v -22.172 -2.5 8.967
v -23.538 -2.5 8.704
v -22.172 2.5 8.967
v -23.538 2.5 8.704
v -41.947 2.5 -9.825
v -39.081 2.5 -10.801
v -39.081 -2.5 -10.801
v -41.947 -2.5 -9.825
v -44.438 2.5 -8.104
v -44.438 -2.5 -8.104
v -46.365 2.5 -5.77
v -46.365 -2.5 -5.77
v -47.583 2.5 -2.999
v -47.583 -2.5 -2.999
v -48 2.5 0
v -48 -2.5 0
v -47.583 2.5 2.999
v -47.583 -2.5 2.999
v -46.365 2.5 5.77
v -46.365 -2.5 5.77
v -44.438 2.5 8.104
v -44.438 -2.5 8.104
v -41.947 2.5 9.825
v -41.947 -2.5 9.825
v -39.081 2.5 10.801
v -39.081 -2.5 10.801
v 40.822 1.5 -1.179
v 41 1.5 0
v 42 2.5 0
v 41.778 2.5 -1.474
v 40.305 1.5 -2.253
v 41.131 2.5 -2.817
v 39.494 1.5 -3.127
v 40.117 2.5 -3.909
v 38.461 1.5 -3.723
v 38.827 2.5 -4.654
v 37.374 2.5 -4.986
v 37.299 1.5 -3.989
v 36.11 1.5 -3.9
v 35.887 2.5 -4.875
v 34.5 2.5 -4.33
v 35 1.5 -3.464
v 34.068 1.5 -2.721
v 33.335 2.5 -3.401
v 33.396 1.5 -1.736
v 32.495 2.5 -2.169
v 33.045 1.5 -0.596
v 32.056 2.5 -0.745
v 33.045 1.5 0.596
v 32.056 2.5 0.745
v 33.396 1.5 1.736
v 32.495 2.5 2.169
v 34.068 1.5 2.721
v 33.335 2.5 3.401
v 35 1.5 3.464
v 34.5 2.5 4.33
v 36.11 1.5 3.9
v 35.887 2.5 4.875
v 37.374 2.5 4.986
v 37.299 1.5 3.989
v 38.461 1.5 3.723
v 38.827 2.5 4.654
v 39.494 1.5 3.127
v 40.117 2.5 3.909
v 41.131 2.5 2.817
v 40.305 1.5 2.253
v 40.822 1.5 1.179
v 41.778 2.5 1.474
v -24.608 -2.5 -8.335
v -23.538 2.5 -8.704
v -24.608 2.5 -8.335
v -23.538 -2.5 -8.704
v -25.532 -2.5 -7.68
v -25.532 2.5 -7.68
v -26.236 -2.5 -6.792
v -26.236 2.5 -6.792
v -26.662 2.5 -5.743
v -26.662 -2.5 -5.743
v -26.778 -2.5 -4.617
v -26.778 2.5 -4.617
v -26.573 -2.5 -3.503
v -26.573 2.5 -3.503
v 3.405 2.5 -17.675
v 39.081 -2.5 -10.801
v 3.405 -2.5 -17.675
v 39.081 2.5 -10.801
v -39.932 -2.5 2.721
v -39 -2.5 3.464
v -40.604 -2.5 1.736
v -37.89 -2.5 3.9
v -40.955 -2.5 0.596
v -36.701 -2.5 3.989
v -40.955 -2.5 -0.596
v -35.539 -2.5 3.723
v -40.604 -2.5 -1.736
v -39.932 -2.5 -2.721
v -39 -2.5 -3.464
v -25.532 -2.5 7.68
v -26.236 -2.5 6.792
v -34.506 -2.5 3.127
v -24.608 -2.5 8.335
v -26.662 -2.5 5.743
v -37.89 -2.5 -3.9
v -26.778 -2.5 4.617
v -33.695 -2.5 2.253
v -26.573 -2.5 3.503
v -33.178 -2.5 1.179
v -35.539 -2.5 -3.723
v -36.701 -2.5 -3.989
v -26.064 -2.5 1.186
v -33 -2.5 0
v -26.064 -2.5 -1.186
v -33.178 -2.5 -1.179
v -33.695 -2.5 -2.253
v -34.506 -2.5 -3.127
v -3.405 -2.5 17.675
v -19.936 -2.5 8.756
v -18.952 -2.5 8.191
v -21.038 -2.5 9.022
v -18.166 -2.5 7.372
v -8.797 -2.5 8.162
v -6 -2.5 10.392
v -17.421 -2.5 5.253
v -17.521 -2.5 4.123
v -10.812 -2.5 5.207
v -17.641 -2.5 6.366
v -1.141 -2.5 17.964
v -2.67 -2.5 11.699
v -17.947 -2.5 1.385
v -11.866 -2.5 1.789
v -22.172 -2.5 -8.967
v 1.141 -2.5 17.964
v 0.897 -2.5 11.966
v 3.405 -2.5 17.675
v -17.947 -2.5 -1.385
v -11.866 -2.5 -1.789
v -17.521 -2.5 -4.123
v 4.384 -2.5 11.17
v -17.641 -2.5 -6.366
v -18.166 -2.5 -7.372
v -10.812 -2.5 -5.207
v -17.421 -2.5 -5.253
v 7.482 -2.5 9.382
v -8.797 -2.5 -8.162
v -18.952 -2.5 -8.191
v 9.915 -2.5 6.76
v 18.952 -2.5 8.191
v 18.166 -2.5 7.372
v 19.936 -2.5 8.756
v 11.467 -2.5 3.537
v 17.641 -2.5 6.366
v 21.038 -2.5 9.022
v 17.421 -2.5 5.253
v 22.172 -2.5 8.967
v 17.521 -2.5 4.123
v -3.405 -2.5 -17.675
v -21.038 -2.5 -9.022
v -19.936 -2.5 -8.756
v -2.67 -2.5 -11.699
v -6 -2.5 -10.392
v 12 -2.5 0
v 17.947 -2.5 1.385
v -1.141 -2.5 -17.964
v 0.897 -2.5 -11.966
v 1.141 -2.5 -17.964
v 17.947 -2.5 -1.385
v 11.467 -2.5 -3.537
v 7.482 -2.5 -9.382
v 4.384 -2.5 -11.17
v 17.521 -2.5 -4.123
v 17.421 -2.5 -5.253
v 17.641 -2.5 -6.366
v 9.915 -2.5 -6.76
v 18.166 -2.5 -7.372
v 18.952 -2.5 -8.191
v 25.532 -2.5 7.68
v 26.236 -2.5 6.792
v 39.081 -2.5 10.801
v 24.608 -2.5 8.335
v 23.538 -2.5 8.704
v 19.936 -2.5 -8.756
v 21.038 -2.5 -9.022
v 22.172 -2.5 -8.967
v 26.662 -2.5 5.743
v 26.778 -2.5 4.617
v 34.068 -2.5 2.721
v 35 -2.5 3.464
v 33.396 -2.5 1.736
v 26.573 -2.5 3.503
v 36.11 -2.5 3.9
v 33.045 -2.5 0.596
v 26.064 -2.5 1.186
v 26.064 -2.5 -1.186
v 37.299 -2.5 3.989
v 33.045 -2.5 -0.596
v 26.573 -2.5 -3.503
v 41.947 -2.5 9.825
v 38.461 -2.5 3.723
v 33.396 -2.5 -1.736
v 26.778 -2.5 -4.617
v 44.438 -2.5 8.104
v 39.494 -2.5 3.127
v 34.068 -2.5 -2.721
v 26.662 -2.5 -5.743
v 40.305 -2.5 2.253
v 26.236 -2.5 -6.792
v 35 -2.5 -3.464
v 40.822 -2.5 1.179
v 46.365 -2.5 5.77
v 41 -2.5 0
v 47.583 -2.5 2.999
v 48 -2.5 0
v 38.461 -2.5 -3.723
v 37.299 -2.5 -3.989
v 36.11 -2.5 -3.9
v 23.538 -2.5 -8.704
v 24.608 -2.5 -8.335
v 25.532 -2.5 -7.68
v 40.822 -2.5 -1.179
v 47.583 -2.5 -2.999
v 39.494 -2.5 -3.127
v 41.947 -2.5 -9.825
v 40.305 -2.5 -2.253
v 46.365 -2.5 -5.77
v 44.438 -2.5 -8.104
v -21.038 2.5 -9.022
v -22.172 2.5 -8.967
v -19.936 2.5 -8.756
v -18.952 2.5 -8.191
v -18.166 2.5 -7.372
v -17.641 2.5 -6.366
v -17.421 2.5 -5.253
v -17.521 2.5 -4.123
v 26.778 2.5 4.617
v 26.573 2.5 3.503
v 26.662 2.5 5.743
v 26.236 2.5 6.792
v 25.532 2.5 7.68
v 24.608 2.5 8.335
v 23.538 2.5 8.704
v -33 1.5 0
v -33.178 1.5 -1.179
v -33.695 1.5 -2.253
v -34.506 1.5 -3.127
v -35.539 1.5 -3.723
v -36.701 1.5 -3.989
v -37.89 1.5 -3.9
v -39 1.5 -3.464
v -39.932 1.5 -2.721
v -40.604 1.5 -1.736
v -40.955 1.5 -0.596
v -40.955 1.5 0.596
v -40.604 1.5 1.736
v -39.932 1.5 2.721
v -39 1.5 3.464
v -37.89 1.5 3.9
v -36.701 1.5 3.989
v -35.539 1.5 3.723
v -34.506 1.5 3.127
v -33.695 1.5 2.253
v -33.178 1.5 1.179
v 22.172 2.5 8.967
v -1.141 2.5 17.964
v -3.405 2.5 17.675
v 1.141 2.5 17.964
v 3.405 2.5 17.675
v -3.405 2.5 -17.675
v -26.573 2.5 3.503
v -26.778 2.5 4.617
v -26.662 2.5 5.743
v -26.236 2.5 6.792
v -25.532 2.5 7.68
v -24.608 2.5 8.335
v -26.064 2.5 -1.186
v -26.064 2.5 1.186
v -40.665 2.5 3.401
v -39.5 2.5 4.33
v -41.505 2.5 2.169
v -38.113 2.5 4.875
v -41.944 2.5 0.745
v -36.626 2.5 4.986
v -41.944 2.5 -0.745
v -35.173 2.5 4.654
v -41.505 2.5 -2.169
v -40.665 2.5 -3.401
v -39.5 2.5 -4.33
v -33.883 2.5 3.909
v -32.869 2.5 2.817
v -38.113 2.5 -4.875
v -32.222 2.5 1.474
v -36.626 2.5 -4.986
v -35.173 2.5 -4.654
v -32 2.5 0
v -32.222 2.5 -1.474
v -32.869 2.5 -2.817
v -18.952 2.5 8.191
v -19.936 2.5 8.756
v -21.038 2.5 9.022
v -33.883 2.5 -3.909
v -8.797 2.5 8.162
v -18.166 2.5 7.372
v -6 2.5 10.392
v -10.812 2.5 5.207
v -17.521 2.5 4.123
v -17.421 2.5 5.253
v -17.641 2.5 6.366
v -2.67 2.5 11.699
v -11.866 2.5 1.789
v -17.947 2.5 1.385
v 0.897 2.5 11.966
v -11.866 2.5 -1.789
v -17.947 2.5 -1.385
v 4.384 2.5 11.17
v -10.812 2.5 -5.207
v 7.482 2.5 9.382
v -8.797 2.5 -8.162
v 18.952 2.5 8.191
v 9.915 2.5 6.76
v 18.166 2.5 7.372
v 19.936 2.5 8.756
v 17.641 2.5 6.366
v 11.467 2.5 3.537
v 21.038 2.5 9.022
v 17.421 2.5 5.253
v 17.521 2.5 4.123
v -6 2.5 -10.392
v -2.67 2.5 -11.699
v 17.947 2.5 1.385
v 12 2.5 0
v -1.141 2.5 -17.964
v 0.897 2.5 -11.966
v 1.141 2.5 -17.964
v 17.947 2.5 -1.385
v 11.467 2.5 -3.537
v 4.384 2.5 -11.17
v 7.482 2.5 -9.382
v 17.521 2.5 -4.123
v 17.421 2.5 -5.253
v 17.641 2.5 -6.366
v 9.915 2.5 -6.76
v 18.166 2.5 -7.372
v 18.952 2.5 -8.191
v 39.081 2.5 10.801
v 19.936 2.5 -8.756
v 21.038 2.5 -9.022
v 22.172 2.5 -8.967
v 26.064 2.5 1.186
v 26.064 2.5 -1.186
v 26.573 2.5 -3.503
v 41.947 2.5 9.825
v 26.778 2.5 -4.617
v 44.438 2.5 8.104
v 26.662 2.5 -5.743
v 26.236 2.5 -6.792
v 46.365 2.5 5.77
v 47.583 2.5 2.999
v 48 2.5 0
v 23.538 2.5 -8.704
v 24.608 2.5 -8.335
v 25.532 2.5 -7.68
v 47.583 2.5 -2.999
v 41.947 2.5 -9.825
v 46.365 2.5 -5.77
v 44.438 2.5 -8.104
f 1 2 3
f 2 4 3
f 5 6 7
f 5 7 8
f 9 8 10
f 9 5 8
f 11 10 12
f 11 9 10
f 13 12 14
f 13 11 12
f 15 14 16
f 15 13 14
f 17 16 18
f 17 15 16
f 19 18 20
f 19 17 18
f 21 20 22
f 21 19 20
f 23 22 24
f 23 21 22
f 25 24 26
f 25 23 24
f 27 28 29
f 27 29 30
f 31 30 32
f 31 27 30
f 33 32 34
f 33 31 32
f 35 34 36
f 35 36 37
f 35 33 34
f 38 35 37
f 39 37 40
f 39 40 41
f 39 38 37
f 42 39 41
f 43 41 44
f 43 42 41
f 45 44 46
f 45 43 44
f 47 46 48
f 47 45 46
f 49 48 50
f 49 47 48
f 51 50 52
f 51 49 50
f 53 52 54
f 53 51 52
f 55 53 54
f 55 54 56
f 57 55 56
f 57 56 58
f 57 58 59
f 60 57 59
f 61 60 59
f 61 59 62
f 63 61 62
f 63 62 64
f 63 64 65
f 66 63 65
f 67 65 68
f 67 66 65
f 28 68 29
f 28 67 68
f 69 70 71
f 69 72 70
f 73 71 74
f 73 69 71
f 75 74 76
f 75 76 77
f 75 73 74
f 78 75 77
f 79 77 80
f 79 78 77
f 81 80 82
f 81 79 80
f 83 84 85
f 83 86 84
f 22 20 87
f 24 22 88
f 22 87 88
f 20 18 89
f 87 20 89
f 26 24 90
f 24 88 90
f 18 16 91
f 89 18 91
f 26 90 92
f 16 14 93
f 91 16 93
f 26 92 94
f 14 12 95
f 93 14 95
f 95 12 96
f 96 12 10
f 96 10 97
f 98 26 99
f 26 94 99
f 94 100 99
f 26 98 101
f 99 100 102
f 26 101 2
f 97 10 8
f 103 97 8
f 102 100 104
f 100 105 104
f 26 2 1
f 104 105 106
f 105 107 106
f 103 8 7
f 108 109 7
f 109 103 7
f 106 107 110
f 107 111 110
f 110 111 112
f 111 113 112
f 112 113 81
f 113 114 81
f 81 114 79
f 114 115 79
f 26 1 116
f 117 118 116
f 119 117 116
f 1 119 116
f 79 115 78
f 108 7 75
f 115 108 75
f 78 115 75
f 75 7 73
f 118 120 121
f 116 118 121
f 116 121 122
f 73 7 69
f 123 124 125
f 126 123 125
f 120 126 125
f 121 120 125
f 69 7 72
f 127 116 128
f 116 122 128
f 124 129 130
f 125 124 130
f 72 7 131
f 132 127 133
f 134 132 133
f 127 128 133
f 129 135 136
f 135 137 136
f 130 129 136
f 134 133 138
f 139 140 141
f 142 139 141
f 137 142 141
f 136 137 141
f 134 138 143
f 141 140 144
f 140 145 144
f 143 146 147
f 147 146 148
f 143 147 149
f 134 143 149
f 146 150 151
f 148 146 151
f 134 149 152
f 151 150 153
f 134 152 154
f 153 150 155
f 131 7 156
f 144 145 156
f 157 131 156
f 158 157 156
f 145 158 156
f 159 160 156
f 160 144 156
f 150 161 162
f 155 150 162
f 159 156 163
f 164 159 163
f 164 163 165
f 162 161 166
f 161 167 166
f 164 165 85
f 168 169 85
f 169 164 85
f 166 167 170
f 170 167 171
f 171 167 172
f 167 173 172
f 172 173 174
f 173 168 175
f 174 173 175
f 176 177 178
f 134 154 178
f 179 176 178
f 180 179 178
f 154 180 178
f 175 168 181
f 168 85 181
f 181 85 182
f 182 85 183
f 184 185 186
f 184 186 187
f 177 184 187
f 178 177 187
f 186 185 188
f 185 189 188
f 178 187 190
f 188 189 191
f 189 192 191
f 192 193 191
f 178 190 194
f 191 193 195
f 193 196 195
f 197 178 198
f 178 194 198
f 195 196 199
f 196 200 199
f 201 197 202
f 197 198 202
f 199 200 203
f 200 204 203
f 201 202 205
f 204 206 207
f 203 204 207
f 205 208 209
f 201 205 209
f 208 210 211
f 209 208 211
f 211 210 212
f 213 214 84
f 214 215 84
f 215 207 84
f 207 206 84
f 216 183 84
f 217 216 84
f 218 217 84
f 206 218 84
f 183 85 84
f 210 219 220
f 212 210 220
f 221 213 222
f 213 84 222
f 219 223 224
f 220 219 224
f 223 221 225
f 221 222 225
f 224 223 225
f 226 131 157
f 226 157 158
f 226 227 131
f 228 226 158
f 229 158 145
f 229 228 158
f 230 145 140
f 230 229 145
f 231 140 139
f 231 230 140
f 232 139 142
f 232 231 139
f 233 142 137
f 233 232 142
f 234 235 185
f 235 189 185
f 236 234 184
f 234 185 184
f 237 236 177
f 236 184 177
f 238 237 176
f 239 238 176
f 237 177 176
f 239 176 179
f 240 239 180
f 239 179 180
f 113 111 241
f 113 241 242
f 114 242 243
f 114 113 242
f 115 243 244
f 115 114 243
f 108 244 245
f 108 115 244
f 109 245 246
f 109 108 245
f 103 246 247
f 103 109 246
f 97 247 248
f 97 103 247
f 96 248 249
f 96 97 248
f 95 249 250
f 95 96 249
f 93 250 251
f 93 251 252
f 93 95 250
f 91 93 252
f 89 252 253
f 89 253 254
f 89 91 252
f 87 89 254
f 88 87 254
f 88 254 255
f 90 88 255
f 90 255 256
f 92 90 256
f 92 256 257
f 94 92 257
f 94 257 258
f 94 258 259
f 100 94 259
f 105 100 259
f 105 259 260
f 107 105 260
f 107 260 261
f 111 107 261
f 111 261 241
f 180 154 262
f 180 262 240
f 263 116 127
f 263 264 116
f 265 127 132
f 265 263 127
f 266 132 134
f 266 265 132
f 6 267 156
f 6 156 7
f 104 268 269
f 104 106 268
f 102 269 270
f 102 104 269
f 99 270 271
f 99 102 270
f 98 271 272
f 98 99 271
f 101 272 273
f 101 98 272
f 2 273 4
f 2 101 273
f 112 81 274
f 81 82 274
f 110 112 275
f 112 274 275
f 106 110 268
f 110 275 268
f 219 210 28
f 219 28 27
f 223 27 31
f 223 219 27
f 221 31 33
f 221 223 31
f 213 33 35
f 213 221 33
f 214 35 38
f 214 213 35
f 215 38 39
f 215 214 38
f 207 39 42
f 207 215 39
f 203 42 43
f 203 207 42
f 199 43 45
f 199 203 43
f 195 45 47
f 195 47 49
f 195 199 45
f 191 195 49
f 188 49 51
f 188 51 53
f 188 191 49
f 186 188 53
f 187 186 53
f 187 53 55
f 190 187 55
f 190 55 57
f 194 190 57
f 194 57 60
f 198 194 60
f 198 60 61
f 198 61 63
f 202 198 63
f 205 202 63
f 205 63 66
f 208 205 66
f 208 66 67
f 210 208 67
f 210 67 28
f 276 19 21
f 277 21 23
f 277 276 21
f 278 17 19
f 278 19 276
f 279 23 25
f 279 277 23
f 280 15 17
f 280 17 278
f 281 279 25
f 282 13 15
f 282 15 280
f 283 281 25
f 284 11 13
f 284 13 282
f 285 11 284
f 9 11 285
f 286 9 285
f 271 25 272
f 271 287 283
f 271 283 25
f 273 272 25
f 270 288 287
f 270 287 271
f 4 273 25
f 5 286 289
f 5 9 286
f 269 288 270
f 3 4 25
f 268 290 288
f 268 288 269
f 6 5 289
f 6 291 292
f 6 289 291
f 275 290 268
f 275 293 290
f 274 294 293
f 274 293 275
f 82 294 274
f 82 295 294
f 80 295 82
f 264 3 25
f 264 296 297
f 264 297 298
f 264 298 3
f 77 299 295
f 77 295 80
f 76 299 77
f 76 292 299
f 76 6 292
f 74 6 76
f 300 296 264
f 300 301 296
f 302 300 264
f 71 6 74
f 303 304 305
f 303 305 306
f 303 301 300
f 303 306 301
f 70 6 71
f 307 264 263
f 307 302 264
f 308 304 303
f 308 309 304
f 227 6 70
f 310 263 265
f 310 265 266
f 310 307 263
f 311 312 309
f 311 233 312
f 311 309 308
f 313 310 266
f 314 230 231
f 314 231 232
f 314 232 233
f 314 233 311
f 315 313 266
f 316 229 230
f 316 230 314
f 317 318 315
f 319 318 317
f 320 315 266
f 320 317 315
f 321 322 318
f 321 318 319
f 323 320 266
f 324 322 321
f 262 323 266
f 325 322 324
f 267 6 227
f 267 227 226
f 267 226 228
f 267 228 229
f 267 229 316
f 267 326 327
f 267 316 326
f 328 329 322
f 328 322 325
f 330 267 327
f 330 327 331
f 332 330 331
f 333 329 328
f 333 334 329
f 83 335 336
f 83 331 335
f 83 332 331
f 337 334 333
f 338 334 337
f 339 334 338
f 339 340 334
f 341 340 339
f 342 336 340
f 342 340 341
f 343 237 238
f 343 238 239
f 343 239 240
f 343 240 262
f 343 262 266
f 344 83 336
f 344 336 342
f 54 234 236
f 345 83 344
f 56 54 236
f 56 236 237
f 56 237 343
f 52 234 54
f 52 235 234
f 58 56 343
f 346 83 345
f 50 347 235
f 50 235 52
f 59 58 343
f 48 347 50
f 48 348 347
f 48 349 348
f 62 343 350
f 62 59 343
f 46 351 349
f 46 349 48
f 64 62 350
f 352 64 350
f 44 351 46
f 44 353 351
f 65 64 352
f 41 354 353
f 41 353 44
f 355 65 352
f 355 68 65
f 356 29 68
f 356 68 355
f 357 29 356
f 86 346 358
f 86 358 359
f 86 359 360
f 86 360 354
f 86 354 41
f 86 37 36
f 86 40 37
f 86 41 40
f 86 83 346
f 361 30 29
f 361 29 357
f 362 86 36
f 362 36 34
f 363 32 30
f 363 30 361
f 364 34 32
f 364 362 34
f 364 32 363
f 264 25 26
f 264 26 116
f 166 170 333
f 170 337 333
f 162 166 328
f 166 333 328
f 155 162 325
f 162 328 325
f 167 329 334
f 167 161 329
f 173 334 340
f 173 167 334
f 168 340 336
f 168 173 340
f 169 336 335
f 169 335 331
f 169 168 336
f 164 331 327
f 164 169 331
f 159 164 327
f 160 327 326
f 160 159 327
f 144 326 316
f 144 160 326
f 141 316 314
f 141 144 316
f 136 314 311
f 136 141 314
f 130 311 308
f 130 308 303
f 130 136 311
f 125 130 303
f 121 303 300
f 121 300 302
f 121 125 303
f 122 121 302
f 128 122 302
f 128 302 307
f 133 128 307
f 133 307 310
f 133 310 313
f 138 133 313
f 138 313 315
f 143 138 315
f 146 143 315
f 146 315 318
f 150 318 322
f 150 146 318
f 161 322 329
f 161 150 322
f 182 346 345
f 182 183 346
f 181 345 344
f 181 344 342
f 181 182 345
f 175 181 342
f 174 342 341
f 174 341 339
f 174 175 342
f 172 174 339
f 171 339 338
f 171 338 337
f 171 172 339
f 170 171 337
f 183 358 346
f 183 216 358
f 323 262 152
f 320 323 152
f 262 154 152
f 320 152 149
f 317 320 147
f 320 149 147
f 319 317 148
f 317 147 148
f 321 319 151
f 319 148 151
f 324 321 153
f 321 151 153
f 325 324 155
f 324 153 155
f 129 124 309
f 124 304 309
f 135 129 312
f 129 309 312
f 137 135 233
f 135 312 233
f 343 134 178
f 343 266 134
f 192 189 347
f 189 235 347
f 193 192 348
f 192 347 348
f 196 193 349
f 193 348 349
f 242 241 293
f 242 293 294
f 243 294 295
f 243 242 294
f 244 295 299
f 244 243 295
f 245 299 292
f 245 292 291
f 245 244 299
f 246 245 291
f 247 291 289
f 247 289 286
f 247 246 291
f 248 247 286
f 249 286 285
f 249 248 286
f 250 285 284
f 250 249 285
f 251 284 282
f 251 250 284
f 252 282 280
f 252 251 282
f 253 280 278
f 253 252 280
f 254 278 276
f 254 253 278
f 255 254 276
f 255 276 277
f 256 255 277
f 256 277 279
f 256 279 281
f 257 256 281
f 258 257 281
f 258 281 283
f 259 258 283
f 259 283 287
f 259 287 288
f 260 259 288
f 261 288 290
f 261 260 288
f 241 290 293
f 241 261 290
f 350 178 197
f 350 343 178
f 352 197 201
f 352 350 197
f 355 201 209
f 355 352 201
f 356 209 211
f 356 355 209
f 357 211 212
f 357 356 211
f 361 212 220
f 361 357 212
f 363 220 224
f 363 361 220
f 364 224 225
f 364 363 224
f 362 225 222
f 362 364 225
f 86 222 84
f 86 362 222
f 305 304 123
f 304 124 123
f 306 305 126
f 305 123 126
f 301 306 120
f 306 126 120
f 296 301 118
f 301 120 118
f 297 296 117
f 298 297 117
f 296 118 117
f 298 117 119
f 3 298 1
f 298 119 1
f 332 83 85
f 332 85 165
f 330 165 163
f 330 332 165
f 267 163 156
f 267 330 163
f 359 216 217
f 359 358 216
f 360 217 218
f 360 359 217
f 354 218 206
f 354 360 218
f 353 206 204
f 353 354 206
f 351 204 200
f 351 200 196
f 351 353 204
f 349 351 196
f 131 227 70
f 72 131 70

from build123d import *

# Parameters (mm, degrees)
SKETCH1_R           = 4
SKETCH1_R_2         = 12
BOSS_EXTRUDE1_DEPTH = 2.5
FILLET1_R           = 4
CHAMFER1_SIZE       = 1


with BuildPart() as part:
    # Sketch1 → Boss-Extrude1 (new body, symmetric)
    with BuildSketch(Plane(origin=(0, 0, 0), x_dir=(1, 0, 0), z_dir=(0, 1, 0))):
        with BuildLine():
            Line((39.081081081, 10.801347209), (3.405405405, 17.674931797))
            ThreePointArc((3.405405405, 17.674931797), (0, 18), (-3.405405405, 17.674931797))
            Line((-3.405405405, 17.674931797), (-39.081081081, 10.801347209))
            ThreePointArc((-39.081081081, 10.801347209), (-48, 0), (-39.081081081, -10.801347209))
            Line((-39.081081081, -10.801347209), (-3.405405405, -17.674931797))
            ThreePointArc((-3.405405405, -17.674931797), (0, -18), (3.405405405, -17.674931797))
            Line((3.405405405, -17.674931797), (39.081081081, -10.801347209))
            ThreePointArc((39.081081081, -10.801347209), (48, 0), (39.081081081, 10.801347209))
        make_face()
        with Locations((37, 0)):
            Circle(SKETCH1_R, mode=Mode.SUBTRACT)
        with Locations((-37, 0)):
            Circle(SKETCH1_R, mode=Mode.SUBTRACT)
        Circle(SKETCH1_R_2, mode=Mode.SUBTRACT)
        with BuildLine():
            Line((-29.082089608, -7.635882073), (-14.68452203, -10.40984211))
            ThreePointArc((-14.68452203, -10.40984211), (-18, 0), (-14.68452203, 10.40984211))
            Line((-14.68452203, 10.40984211), (-29.082089608, 7.635882073))
            ThreePointArc((-29.082089608, 7.635882073), (-26, 0), (-29.082089608, -7.635882073))
        make_face(mode=Mode.SUBTRACT)
        with BuildLine():
            ThreePointArc((14.68452203, 10.40984211), (18, 0), (14.68452203, -10.40984211))
            Line((14.68452203, -10.40984211), (29.082089608, -7.635882073))
            ThreePointArc((29.082089608, -7.635882073), (26, 0), (29.082089608, 7.635882073))
            Line((29.082089608, 7.635882073), (14.68452203, 10.40984211))
        make_face(mode=Mode.SUBTRACT)
    extrude(amount=BOSS_EXTRUDE1_DEPTH, both=True)

    # Fillet1
    fillet1_edges = [part.edges().sort_by_distance(p)[0] for p in [
        (14.68452203, 0, 10.40984211),
        (29.082089608, 0, 7.635882073),
        (29.082089608, 0, -7.635882073),
        (14.68452203, 0, -10.40984211),
        (-14.68452203, 0, 10.40984211),
        (-14.68452203, 0, -10.40984211),
        (-29.082089608, 0, -7.635882073),
        (-29.082089608, 0, 7.635882073),
    ]]
    fillet(fillet1_edges, radius=FILLET1_R)

    # Chamfer1
    chamfer1_edges = [part.edges().sort_by_distance(p)[0] for p in [
        (33, 2.5, 0),
        (-41, 2.5, 0),
    ]]
    chamfer(chamfer1_edges, length=CHAMFER1_SIZE)


solid = part.part
